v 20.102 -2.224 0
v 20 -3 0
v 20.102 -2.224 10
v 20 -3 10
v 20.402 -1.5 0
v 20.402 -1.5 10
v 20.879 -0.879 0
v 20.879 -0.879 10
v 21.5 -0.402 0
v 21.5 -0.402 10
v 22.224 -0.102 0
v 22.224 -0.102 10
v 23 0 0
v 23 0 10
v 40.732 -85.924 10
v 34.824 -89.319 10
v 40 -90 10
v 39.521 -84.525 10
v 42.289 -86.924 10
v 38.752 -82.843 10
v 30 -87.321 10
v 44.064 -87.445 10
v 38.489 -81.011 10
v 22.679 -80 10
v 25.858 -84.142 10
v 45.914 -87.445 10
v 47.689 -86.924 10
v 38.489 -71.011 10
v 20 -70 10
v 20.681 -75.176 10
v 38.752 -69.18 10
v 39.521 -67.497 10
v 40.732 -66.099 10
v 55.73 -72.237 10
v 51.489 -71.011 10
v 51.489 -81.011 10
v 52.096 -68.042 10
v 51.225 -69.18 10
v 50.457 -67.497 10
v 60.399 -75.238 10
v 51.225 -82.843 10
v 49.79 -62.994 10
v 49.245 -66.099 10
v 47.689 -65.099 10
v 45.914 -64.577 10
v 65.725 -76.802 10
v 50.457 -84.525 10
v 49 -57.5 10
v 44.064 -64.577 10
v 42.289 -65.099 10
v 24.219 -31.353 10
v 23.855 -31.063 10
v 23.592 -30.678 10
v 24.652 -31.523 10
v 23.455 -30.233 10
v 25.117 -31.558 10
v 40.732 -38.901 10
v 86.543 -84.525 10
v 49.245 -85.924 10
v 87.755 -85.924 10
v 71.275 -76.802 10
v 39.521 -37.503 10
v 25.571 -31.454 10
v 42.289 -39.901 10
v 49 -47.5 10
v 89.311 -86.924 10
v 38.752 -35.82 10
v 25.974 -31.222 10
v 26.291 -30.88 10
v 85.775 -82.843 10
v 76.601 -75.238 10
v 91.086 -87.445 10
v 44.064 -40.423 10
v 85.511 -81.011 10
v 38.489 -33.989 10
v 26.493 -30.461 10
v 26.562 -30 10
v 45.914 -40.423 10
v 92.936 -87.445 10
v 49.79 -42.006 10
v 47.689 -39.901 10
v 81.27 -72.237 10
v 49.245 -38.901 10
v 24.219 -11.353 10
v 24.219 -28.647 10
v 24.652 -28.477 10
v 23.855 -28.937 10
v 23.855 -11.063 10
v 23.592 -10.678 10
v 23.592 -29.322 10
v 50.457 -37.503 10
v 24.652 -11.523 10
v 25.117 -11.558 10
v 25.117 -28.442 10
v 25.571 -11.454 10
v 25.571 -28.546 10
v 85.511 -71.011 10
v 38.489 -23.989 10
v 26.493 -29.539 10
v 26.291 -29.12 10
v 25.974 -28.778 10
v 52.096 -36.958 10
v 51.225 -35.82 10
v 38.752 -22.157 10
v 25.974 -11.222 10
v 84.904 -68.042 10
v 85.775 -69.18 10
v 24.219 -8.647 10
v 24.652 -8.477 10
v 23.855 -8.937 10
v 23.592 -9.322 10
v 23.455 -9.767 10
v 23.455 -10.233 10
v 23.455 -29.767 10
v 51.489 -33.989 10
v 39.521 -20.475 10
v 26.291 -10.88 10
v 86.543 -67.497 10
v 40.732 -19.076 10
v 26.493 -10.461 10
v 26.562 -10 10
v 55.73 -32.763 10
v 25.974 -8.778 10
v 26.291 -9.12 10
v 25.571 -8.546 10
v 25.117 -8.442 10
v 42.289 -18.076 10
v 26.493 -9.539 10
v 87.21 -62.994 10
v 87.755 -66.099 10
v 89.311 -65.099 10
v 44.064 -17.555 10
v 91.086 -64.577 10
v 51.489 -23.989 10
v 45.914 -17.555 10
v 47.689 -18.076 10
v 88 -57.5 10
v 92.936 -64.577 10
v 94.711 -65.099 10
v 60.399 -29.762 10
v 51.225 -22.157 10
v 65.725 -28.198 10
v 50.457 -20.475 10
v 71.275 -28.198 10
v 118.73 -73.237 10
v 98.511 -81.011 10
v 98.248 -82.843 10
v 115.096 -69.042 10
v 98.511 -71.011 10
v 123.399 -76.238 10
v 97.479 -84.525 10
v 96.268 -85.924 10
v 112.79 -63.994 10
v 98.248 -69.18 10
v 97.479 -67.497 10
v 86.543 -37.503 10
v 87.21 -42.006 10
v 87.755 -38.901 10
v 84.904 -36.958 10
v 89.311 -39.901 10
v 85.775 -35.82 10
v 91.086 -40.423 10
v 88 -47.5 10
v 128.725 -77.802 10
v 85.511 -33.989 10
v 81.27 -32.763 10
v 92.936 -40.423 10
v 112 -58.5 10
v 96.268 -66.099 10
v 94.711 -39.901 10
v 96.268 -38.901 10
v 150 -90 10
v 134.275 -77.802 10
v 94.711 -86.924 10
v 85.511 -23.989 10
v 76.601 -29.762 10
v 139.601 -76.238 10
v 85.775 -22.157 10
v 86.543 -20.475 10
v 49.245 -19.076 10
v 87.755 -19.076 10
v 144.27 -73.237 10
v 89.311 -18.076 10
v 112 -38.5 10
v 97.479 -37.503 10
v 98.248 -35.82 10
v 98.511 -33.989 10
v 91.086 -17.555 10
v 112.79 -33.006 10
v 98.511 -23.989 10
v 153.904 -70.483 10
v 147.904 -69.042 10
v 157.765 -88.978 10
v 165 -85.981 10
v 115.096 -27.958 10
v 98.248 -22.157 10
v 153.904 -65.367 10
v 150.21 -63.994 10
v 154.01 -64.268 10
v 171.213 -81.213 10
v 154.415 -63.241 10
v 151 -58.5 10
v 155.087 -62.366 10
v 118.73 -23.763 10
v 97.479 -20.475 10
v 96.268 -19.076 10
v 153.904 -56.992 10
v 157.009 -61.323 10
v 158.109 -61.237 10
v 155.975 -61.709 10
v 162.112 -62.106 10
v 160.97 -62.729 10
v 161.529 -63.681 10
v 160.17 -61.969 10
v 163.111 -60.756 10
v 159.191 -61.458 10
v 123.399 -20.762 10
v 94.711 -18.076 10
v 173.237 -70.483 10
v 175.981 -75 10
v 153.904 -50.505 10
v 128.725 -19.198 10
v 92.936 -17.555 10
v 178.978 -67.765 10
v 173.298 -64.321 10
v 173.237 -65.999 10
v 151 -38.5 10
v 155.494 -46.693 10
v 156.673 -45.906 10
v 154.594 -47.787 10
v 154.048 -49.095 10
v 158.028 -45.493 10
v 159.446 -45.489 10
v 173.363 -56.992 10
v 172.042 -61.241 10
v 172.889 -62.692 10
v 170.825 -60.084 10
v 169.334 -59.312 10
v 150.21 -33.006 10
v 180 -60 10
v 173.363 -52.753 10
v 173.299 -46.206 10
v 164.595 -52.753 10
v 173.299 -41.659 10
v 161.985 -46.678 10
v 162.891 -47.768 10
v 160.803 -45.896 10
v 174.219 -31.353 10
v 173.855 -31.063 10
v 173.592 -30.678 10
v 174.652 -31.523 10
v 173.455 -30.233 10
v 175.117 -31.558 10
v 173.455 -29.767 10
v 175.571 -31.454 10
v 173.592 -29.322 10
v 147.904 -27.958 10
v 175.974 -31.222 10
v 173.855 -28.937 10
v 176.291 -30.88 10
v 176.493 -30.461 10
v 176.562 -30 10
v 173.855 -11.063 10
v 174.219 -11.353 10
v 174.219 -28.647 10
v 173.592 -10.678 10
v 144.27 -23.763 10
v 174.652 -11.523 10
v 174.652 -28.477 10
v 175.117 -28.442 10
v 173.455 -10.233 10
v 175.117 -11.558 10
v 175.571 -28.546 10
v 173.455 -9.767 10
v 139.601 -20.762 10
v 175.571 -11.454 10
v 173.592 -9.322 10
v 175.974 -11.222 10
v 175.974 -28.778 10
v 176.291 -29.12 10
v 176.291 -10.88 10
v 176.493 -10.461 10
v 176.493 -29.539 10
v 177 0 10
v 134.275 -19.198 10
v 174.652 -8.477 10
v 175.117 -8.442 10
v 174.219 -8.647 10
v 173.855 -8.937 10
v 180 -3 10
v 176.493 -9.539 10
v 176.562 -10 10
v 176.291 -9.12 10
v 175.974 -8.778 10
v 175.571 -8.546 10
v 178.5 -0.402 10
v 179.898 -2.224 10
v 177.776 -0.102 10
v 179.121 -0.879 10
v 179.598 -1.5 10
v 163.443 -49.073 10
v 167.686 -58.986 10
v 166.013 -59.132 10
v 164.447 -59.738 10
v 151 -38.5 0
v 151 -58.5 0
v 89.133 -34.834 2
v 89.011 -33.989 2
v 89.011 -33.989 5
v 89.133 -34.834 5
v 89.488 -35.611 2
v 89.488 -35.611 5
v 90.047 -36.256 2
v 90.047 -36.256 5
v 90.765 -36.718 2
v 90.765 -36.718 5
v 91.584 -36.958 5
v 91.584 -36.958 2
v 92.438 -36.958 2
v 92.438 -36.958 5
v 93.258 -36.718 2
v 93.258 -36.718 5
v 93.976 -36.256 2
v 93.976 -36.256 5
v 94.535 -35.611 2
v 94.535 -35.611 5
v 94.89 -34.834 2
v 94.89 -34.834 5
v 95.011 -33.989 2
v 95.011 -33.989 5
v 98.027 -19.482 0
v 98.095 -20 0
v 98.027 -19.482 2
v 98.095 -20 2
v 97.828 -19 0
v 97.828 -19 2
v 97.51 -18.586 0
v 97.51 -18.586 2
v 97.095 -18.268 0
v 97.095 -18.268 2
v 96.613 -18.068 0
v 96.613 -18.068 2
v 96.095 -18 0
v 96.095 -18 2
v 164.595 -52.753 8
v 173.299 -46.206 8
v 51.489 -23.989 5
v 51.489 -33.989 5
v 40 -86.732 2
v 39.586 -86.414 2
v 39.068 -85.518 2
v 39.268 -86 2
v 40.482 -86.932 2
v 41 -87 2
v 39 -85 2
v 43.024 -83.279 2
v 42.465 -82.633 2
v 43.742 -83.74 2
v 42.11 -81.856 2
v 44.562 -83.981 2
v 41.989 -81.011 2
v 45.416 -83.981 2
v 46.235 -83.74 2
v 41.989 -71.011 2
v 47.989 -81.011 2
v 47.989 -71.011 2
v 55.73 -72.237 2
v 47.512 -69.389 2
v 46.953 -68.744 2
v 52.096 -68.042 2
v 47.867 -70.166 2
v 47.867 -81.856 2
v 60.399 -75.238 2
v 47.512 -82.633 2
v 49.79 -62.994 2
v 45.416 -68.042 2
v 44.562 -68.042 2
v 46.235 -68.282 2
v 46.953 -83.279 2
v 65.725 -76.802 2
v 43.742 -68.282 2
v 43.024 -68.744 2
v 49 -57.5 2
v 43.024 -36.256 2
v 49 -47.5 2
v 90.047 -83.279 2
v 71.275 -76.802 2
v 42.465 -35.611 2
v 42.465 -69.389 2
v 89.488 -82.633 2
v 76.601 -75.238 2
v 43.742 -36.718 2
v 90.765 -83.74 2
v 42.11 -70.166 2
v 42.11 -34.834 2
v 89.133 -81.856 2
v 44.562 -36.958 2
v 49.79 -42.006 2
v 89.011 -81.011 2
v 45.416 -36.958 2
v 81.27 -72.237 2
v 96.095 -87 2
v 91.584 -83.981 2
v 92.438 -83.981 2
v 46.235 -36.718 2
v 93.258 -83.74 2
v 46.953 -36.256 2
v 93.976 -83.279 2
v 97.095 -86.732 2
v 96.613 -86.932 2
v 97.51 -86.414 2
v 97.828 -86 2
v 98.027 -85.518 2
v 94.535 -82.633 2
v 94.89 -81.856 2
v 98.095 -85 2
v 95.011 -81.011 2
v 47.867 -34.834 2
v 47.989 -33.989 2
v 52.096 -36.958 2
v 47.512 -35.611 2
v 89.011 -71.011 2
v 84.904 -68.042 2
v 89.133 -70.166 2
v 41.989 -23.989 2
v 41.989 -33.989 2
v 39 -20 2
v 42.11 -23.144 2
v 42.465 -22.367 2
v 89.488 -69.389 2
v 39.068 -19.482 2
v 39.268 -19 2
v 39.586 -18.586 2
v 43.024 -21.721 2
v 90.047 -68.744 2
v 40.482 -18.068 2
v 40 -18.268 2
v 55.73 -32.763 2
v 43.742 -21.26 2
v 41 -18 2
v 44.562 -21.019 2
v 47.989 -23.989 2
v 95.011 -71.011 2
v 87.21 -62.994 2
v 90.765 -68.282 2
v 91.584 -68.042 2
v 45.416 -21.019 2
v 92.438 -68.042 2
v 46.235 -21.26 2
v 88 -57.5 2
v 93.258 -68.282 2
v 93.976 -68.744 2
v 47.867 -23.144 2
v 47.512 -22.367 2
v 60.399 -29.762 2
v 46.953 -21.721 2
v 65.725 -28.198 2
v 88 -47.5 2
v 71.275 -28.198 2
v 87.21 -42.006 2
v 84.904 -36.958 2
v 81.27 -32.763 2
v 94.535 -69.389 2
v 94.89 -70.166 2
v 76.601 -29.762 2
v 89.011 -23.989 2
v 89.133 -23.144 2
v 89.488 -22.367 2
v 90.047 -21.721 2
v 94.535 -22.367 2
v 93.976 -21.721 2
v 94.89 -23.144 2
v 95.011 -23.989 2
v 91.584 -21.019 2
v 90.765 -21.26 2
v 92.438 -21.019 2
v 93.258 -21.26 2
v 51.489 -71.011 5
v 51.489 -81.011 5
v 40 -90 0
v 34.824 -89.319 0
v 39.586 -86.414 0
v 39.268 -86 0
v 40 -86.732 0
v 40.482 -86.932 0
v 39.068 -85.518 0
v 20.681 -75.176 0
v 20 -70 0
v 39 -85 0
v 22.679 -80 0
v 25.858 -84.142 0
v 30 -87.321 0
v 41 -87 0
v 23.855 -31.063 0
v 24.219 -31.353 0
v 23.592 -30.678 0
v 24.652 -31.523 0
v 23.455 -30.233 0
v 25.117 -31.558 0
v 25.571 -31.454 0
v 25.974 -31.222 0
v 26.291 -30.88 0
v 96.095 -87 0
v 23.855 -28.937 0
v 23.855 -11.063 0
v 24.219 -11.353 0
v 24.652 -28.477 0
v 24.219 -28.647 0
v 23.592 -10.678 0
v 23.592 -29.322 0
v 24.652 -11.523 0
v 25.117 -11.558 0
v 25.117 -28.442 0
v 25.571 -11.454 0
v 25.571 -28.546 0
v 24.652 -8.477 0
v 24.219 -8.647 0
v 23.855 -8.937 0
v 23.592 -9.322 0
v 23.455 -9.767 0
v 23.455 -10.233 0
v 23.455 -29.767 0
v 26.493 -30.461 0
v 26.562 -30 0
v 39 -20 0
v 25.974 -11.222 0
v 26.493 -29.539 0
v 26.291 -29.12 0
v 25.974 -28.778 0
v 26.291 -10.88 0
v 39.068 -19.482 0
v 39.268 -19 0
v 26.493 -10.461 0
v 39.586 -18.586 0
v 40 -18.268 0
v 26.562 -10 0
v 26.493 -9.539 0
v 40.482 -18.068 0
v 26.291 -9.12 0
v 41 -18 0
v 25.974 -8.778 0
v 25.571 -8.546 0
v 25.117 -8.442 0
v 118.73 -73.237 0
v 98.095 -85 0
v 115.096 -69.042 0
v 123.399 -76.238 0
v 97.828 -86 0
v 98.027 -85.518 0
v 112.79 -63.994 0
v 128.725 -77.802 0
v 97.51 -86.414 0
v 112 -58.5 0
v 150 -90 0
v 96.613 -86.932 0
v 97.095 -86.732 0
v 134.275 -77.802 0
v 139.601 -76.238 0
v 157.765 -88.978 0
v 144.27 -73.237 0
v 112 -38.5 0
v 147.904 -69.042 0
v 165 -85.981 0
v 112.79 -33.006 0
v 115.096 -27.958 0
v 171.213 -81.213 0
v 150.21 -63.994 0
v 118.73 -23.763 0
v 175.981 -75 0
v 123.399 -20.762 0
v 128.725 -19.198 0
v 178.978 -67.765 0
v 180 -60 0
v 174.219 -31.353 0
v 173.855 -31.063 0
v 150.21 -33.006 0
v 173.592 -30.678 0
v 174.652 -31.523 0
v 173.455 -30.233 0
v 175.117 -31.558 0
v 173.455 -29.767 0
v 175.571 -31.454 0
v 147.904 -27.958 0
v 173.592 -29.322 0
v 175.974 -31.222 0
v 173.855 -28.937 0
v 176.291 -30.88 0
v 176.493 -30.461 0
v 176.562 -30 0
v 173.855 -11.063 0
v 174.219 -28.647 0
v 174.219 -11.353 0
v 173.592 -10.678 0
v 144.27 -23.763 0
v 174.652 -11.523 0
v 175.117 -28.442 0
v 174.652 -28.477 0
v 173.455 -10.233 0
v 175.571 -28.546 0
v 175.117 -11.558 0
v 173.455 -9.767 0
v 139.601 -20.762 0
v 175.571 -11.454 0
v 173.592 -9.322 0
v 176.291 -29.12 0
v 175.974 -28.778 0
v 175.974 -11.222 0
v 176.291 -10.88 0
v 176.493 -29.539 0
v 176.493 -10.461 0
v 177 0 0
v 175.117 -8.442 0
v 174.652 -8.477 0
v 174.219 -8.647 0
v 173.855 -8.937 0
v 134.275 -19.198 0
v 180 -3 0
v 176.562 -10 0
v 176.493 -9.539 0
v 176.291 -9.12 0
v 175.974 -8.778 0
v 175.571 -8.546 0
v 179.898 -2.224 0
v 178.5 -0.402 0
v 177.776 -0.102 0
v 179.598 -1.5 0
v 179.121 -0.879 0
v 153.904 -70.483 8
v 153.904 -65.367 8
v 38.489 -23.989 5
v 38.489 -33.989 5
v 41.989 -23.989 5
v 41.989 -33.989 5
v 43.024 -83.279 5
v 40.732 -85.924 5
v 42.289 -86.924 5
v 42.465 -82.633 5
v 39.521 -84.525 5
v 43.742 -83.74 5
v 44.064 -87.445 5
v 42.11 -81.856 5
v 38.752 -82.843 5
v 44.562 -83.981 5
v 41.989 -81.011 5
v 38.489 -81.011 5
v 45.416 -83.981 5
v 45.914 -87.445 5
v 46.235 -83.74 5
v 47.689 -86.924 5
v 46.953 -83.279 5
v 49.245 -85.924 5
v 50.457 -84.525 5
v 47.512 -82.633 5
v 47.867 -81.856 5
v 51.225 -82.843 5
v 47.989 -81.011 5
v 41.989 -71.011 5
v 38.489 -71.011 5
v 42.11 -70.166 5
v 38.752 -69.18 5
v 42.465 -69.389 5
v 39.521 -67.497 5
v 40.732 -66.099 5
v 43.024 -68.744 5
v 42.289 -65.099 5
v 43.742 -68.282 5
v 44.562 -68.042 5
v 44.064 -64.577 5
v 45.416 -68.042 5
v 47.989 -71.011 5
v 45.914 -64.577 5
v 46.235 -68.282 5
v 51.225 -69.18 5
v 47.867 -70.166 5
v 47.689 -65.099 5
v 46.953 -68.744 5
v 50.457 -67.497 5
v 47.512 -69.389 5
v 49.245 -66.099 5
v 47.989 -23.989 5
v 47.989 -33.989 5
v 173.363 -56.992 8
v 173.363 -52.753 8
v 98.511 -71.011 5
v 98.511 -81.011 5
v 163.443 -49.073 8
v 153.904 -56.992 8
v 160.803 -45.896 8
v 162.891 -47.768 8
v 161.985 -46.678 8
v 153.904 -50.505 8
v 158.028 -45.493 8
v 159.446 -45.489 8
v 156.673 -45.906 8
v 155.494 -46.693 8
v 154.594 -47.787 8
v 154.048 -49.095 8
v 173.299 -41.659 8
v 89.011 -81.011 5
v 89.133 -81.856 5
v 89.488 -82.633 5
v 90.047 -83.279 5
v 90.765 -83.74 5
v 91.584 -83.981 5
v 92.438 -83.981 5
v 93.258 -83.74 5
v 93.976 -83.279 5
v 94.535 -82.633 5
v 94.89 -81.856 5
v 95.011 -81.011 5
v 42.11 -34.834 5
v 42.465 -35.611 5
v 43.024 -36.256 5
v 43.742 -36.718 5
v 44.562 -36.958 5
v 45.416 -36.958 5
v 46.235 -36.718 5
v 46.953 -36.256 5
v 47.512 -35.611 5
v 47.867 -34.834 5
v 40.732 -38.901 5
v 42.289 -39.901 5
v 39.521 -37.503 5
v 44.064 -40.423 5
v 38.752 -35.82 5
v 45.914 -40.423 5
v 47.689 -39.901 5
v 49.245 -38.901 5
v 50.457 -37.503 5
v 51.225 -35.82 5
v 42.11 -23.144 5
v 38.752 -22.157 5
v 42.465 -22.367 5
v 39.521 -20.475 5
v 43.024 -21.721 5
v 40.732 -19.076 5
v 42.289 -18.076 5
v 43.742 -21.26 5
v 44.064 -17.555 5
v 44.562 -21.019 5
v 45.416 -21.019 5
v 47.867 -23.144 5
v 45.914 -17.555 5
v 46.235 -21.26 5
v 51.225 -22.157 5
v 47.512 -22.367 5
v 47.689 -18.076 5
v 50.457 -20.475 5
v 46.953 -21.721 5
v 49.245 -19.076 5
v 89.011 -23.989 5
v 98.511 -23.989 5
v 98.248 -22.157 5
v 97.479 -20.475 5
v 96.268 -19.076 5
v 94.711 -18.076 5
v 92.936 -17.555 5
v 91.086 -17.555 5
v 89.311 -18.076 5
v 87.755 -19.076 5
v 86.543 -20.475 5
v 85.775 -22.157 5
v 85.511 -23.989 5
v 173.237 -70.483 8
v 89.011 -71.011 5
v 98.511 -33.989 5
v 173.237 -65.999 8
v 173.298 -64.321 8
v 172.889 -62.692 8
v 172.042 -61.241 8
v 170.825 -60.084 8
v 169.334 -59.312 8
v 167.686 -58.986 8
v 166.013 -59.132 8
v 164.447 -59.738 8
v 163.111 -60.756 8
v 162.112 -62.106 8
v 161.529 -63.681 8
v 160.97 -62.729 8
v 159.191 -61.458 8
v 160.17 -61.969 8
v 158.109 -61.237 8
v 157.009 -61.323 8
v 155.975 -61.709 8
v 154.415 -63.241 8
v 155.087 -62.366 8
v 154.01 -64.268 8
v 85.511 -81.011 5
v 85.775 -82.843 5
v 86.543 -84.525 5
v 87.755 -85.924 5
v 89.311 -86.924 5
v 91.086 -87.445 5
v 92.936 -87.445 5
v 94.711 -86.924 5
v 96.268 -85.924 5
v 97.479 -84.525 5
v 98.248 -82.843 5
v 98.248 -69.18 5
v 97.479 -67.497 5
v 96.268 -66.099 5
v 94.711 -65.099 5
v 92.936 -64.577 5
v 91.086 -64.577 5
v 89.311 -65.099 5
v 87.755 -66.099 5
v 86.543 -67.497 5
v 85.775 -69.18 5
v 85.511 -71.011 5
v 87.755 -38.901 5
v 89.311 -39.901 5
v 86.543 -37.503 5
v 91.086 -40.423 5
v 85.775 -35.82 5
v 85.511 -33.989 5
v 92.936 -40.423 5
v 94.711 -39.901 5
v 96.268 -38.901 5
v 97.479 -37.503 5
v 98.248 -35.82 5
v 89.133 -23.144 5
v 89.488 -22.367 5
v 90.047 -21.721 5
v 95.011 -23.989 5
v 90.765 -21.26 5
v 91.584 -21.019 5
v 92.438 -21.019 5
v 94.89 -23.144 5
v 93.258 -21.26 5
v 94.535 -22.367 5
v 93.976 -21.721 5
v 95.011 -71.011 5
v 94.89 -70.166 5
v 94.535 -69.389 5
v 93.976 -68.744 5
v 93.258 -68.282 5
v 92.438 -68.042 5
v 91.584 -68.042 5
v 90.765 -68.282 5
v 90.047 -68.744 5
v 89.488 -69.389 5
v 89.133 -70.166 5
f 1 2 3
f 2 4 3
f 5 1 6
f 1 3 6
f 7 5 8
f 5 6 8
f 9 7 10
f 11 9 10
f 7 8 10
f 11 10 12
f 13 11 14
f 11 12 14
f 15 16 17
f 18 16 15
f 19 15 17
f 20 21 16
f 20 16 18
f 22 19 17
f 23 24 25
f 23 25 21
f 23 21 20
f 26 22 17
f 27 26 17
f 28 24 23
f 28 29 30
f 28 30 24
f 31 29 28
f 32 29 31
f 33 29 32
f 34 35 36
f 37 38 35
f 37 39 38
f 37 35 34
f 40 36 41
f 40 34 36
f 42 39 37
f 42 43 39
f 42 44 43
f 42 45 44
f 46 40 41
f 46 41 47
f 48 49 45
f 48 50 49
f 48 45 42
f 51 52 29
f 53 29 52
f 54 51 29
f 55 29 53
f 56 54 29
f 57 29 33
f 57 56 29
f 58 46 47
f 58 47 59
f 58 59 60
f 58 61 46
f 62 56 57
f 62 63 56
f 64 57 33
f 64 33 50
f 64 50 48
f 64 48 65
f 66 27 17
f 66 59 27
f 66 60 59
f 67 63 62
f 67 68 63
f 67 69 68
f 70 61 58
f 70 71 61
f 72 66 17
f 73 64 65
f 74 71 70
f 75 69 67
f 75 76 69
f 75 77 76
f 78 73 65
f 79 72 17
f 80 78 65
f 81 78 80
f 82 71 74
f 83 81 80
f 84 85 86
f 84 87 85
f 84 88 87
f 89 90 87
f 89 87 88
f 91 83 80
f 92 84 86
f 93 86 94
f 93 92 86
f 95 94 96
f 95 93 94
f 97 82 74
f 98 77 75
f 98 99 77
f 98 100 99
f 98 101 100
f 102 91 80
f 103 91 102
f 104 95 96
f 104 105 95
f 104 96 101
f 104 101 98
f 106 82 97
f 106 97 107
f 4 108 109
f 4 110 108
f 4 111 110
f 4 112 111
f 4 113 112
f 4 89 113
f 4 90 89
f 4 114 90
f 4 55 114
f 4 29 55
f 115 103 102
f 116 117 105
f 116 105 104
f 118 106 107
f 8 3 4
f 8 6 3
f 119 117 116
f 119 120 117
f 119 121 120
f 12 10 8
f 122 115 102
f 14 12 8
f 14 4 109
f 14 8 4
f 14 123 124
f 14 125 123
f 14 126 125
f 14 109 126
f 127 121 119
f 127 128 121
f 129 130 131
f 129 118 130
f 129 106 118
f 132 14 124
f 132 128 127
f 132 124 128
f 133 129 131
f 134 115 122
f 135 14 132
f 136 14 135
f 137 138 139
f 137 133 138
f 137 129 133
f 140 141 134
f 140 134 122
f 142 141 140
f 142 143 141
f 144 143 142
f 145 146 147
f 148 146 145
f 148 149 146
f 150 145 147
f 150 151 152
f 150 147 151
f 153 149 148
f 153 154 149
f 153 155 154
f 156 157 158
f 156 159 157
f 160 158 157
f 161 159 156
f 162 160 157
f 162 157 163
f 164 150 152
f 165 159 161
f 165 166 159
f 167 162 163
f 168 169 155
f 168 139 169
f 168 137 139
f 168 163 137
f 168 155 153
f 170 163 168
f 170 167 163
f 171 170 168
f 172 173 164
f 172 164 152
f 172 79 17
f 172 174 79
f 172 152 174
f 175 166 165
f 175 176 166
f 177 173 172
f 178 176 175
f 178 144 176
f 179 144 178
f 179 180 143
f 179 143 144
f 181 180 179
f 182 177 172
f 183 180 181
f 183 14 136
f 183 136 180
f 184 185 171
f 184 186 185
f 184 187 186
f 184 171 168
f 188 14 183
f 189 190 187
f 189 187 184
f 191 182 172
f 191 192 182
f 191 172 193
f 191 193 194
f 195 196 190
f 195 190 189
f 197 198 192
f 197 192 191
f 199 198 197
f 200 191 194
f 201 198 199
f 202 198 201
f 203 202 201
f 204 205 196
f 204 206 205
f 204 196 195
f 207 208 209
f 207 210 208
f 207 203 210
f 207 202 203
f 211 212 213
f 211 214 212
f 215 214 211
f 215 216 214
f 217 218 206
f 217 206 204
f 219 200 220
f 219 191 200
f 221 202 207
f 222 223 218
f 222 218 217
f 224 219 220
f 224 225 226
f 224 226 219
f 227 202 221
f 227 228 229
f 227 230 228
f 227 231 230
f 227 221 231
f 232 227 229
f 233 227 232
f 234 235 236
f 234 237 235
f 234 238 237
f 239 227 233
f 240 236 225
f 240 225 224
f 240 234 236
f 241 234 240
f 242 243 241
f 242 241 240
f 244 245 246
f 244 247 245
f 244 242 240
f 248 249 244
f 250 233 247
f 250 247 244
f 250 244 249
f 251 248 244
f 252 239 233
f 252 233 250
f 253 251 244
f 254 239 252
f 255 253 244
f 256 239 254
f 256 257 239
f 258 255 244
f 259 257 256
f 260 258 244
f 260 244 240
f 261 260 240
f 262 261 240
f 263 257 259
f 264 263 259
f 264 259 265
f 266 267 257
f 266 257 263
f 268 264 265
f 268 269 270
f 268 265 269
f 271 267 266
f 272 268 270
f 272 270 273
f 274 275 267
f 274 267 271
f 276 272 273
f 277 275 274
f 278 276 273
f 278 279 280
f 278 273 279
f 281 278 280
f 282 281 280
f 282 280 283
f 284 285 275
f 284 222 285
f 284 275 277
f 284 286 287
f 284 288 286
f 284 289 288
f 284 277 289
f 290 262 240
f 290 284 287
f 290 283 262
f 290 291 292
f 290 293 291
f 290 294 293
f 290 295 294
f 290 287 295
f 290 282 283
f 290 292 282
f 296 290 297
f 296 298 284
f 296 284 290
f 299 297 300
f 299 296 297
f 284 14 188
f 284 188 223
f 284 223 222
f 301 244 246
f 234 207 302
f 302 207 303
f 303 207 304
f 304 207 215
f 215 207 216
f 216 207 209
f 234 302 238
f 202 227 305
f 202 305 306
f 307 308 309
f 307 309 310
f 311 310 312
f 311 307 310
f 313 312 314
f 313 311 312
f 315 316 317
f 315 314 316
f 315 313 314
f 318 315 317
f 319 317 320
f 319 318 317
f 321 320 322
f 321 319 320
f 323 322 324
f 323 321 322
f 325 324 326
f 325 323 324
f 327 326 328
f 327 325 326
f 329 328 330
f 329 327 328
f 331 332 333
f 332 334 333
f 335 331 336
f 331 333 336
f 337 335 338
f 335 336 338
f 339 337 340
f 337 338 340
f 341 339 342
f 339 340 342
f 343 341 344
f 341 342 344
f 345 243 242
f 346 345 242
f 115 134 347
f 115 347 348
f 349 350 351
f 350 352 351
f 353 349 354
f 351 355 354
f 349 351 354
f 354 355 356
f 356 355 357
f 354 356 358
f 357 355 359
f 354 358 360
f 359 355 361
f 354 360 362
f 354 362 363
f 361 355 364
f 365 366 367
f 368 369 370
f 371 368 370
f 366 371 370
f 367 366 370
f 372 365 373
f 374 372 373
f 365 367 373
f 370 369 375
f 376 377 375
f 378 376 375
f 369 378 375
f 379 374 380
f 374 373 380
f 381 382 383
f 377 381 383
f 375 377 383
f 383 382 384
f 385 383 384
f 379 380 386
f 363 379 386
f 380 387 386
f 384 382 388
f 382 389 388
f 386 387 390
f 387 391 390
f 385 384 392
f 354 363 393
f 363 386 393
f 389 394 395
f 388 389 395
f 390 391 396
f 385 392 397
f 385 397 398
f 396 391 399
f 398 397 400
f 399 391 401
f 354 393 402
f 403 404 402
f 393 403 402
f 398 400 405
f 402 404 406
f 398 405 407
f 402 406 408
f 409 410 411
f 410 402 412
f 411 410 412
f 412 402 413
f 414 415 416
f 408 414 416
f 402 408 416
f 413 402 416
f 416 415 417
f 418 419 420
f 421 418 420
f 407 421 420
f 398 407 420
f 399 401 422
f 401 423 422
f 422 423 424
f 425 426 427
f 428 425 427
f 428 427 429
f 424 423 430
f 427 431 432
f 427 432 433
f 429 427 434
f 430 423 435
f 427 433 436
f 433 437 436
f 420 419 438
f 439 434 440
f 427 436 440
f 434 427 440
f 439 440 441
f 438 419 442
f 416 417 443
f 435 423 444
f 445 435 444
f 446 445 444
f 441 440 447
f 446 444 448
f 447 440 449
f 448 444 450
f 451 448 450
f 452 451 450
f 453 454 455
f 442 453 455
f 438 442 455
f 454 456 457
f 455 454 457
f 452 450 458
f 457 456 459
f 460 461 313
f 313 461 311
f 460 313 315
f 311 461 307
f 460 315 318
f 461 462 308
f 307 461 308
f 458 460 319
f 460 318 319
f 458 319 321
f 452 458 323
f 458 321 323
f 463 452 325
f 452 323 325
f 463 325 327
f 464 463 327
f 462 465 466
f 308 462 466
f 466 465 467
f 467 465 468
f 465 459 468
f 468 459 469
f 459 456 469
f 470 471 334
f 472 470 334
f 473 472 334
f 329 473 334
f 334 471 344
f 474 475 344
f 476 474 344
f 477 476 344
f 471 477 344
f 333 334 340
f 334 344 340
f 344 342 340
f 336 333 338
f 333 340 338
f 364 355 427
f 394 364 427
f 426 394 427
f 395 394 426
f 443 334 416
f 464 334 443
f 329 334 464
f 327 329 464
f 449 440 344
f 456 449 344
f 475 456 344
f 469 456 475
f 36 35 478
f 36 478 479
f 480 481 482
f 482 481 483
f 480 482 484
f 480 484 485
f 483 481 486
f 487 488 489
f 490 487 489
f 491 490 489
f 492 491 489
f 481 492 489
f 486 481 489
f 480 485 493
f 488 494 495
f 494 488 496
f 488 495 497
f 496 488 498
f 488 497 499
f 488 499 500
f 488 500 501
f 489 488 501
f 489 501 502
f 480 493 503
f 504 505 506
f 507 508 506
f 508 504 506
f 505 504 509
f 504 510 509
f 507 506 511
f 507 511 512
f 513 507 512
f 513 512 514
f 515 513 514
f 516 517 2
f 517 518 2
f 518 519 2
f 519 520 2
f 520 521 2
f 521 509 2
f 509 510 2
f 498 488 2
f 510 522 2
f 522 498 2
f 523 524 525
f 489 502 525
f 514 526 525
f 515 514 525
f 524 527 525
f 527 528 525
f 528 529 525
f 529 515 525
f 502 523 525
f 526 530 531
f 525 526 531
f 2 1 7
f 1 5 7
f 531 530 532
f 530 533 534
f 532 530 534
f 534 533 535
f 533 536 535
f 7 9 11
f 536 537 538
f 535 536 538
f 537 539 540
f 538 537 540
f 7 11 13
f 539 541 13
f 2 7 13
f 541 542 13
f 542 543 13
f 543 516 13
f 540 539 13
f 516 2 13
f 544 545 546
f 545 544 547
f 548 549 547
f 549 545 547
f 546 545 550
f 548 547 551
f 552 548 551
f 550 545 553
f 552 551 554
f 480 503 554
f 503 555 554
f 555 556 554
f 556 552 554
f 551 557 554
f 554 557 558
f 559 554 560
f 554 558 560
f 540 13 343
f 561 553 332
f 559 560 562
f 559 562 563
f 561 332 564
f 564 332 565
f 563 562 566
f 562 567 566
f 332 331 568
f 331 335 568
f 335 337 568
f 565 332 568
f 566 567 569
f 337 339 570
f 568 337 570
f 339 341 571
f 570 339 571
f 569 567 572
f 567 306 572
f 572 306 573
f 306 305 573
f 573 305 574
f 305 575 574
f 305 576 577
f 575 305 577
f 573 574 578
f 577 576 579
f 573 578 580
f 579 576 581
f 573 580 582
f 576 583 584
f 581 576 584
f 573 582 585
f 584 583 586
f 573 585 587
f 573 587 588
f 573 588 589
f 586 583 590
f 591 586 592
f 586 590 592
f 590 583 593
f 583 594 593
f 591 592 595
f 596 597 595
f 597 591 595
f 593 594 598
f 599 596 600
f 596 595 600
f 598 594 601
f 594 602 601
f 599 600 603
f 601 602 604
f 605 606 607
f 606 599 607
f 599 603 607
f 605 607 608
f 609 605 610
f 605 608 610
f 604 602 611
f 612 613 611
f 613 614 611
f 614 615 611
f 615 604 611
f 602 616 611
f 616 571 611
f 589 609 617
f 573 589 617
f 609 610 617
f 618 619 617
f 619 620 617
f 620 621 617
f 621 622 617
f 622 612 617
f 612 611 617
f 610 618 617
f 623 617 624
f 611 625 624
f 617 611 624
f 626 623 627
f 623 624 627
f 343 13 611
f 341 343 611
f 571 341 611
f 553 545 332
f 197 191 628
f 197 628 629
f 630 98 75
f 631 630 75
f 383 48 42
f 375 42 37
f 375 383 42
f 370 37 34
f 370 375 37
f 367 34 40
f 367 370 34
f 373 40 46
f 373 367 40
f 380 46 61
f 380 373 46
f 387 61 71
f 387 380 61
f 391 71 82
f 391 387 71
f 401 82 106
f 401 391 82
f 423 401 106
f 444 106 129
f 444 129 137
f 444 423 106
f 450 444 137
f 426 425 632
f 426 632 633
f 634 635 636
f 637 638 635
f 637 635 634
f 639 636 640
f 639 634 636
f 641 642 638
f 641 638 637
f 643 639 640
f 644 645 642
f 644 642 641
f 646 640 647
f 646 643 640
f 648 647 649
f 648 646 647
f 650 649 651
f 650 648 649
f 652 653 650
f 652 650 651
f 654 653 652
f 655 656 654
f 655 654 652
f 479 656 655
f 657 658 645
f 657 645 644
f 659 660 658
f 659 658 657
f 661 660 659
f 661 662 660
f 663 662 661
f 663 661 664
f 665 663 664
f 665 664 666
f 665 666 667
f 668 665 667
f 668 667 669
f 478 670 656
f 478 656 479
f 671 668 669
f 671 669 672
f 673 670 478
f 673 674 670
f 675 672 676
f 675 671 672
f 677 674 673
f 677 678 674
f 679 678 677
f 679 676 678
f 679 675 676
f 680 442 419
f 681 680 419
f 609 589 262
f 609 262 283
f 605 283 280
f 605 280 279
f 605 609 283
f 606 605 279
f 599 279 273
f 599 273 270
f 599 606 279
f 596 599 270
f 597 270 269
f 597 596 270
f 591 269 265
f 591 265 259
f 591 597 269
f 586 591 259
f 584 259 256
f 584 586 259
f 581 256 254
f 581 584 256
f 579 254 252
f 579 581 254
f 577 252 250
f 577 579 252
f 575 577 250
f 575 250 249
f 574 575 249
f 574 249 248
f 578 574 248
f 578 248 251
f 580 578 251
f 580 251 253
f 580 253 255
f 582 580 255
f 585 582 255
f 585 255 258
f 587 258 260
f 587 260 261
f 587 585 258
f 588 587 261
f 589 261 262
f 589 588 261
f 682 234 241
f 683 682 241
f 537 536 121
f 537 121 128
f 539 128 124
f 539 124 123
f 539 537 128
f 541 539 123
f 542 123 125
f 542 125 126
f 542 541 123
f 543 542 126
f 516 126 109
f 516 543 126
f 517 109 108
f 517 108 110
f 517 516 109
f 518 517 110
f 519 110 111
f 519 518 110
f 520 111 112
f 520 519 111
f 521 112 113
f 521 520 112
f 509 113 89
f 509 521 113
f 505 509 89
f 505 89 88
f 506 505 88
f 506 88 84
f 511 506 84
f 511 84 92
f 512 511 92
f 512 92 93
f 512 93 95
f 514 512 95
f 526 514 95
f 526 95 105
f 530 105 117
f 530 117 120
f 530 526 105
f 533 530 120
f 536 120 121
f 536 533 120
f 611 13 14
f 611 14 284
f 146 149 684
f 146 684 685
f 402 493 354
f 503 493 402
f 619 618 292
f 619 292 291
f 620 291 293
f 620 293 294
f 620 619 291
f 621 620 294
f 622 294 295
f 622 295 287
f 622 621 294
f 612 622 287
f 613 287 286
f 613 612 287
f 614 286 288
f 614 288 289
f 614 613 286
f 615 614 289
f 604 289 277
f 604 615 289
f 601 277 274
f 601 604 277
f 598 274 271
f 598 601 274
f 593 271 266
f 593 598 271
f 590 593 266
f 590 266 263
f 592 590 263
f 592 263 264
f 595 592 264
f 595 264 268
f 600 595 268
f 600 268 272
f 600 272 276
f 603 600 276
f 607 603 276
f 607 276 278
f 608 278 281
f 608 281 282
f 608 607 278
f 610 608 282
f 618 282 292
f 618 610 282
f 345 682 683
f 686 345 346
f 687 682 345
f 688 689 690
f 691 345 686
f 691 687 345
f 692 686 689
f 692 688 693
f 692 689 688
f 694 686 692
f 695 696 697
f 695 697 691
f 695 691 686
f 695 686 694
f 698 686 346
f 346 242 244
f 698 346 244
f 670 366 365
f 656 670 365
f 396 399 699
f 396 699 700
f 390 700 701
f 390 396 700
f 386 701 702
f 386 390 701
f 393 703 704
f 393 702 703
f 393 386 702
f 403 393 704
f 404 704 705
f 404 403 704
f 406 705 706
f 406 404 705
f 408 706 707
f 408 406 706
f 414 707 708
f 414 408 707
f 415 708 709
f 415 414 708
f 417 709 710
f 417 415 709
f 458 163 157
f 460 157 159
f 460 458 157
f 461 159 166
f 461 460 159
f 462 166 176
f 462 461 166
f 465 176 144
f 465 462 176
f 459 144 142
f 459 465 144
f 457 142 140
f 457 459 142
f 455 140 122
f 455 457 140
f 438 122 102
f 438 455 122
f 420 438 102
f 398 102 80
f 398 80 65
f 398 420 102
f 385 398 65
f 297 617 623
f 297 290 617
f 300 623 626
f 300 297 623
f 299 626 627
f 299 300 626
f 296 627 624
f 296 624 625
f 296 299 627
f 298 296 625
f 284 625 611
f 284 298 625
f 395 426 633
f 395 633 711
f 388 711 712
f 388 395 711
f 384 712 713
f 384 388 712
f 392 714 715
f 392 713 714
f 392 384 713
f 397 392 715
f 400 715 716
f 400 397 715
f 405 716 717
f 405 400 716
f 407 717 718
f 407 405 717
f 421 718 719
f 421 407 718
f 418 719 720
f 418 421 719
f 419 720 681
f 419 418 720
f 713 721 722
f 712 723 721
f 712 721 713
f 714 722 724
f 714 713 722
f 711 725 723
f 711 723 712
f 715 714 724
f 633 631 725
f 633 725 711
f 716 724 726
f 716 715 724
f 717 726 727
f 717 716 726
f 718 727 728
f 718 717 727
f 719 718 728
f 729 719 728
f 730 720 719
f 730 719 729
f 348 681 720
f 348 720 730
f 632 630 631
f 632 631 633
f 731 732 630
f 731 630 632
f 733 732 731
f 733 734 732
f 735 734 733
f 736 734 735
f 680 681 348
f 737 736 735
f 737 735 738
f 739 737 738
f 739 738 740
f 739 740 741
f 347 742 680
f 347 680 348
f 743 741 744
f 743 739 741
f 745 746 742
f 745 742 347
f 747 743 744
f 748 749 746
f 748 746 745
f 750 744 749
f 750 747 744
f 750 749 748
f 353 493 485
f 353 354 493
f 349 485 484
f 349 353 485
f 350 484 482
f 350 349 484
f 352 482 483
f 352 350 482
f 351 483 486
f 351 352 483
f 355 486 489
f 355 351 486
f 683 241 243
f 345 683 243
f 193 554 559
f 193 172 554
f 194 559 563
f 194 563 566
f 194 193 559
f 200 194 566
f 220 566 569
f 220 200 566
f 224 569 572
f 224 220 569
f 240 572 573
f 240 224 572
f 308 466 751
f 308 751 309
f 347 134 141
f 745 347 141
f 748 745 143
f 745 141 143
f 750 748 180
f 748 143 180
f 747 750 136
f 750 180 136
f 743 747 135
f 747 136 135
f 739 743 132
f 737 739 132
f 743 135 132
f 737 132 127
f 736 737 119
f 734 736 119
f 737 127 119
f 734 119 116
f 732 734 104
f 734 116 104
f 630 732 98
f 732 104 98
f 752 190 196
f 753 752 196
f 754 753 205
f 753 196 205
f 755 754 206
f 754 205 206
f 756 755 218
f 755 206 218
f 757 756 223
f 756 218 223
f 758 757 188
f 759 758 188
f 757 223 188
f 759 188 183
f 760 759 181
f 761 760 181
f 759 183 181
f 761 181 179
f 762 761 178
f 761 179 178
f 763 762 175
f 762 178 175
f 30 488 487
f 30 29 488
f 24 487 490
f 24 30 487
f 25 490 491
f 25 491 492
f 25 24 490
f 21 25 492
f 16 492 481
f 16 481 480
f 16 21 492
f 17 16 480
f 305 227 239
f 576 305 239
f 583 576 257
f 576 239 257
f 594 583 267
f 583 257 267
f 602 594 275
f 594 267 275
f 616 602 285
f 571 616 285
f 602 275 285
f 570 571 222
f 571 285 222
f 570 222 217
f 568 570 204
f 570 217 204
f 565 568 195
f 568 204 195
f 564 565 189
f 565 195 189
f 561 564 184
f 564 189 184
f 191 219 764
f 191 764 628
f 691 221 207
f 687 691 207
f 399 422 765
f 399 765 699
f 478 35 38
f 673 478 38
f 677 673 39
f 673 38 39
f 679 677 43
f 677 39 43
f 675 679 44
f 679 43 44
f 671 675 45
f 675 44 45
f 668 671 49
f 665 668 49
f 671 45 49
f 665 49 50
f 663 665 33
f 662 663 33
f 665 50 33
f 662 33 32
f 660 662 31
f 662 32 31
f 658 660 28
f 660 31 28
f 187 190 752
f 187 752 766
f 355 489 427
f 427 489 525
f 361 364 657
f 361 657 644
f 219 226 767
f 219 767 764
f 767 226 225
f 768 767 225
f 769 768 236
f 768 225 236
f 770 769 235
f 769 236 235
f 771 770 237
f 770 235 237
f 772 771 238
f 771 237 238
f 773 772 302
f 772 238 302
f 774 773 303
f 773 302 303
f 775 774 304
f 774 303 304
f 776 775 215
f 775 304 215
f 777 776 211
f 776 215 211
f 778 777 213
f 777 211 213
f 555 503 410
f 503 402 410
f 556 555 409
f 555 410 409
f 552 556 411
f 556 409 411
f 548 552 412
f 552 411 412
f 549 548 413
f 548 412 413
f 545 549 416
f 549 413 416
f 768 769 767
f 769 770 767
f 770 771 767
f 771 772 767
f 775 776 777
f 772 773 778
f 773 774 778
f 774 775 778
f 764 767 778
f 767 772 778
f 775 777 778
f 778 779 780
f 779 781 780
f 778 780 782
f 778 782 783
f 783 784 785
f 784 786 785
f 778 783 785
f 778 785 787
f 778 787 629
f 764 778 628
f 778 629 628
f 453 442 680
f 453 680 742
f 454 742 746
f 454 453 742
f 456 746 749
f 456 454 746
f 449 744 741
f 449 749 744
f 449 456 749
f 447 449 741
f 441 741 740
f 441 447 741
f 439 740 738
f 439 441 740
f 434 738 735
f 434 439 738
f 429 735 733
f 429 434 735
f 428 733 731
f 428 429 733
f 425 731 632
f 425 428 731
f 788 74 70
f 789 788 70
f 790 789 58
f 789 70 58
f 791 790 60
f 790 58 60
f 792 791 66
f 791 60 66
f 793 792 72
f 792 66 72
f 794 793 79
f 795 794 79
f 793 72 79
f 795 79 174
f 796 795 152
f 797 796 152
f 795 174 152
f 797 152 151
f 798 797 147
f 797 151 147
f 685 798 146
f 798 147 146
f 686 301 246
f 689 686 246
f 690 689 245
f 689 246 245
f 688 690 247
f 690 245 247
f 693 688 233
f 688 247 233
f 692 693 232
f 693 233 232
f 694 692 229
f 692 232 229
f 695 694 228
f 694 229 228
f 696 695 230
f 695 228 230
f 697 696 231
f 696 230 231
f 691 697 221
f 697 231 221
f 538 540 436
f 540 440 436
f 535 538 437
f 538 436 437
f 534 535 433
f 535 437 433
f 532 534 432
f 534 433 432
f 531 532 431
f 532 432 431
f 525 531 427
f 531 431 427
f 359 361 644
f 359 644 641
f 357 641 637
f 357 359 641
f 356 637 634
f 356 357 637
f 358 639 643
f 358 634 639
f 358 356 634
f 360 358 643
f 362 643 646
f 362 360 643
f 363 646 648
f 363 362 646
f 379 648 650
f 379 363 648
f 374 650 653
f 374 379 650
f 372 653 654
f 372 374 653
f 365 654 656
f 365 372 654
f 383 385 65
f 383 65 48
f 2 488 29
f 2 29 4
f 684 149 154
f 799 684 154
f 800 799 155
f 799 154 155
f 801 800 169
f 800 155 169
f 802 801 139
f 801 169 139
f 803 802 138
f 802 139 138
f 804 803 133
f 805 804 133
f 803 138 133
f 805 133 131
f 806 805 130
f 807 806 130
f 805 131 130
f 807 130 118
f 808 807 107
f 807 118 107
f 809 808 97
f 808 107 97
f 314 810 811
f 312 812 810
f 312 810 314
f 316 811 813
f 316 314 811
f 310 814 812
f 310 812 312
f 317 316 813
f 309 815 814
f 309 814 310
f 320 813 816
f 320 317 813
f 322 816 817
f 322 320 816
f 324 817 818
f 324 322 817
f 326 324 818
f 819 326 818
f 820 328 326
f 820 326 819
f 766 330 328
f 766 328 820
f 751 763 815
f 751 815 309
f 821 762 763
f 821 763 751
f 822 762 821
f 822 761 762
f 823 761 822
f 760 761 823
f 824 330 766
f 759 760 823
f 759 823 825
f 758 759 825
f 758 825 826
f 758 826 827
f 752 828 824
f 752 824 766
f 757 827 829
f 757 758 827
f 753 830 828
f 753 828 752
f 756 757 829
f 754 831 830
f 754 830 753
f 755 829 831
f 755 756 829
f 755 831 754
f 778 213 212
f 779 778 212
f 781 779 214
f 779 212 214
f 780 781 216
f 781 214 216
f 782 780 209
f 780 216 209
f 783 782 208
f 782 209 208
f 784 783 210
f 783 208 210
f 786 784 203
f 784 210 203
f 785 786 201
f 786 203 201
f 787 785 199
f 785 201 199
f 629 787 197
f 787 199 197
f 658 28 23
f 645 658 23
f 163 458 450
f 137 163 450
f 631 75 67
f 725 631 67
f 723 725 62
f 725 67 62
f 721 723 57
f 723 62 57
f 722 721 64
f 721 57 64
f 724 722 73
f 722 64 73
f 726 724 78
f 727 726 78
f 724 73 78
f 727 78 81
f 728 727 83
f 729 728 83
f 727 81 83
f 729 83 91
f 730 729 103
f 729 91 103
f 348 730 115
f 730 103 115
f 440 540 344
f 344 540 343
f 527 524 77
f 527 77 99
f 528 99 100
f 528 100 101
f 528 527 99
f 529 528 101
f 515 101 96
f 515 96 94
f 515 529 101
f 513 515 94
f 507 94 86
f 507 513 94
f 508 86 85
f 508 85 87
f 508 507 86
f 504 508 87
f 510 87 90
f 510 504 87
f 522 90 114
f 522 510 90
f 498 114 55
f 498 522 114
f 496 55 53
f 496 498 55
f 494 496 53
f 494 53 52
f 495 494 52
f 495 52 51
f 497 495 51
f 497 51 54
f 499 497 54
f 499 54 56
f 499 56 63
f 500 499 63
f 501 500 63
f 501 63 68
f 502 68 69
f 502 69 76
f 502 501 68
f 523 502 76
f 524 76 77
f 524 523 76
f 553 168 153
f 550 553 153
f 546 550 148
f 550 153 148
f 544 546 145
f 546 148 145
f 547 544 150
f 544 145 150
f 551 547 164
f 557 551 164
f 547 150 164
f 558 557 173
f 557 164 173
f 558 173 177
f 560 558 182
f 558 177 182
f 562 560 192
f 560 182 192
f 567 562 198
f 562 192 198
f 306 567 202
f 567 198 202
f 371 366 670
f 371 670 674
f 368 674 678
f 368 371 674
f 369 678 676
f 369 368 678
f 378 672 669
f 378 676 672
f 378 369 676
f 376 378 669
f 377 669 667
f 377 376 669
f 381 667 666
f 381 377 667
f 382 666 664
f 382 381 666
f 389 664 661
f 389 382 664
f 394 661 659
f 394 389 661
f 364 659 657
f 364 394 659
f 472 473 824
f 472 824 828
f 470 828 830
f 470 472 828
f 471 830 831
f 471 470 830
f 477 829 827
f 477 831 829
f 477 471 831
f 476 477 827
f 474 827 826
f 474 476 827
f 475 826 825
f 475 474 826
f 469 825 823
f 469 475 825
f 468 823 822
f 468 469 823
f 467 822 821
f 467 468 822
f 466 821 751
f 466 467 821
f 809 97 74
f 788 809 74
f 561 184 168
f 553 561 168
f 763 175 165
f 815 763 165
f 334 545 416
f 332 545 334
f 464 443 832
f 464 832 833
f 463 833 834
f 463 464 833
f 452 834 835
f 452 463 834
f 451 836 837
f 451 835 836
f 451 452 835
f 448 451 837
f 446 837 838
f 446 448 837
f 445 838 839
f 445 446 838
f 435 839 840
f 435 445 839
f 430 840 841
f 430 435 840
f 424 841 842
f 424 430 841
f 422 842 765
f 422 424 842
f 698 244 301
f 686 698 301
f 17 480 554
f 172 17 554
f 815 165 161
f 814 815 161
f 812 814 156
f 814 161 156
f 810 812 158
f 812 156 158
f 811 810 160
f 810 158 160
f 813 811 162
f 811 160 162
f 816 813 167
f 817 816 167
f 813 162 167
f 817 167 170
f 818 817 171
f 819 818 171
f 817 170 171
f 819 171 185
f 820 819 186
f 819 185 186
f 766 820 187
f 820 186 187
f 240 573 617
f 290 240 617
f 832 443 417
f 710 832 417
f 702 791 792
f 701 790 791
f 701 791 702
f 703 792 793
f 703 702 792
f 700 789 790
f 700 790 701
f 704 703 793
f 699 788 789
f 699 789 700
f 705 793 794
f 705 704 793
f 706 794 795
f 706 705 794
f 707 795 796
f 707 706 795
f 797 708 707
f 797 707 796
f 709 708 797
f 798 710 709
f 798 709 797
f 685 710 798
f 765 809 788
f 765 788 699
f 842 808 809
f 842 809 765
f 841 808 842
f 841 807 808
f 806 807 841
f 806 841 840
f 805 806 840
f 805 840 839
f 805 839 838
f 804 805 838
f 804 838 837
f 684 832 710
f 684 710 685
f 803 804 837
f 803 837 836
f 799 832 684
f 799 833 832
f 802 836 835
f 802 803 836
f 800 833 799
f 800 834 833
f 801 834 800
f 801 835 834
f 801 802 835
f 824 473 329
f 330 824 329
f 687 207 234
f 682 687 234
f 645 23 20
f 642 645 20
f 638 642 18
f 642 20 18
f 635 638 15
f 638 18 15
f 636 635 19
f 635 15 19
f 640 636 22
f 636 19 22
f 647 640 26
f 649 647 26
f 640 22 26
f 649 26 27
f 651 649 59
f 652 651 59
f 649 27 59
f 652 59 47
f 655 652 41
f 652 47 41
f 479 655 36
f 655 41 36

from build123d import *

# Parameters (mm, degrees)
SKETCH_W        = 160
SKETCH_H        = 90
SKETCH_R        = 1.5625
PAD_DEPTH       = 10
POCKET_DEPTH    = 5
FILLET_R        = 20
FILLET001_R     = 30
POCKET001_DEPTH = 10.001
FILLET002_R     = 3
SKETCH003_W     = 59.09549
SKETCH003_H     = 69
POCKET002_DEPTH = 2
FILLET003_R     = 2
POCKET003_DEPTH = 2


with BuildPart() as part:
    # Sketch → Pad (new body)
    with BuildSketch(Plane.XY):
        with Locations((100, -45)):
            Rectangle(SKETCH_W, SKETCH_H)
        with Locations((175, -10)):
            Circle(SKETCH_R, mode=Mode.SUBTRACT)
        with Locations((175, -30)):
            Circle(SKETCH_R, mode=Mode.SUBTRACT)
        with Locations((25, -10)):
            Circle(SKETCH_R, mode=Mode.SUBTRACT)
        with Locations((25, -30)):
            Circle(SKETCH_R, mode=Mode.SUBTRACT)
        with BuildLine():
            ThreePointArc((95.0113, -23.9887), (92.0113, -20.9887), (89.0113, -23.9887))
            Line((89.0113, -23.9887), (89.0113, -33.9887))
            ThreePointArc((89.0113, -33.9887), (92.0113, -36.9887), (95.0113, -33.9887))
            Line((95.0113, -23.9887), (95.0113, -33.9887))
        make_face(mode=Mode.SUBTRACT)
        with BuildLine():
            ThreePointArc((88, -47.5), (68.5, -28), (49, -47.5))
            Line((49, -47.5), (49, -57.5))
            ThreePointArc((49, -57.5), (68.5, -77), (88, -57.5))
            Line((88, -47.5), (88, -57.5))
        make_face(mode=Mode.SUBTRACT)
        with BuildLine():
            ThreePointArc((95.0113, -71.0113), (92.0113, -68.0113), (89.0113, -71.0113))
            Line((89.0113, -71.0113), (89.0113, -81.0113))
            ThreePointArc((89.0113, -81.0113), (92.0113, -84.0113), (95.0113, -81.0113))
            Line((95.0113, -71.0113), (95.0113, -81.0113))
        make_face(mode=Mode.SUBTRACT)
        with BuildLine():
            ThreePointArc((47.9887, -71.0113), (44.9887, -68.0113), (41.9887, -71.0113))
            Line((41.9887, -71.0113), (41.9887, -81.0113))
            ThreePointArc((41.9887, -81.0113), (44.9887, -84.0113), (47.9887, -81.0113))
            Line((47.9887, -71.0113), (47.9887, -81.0113))
        make_face(mode=Mode.SUBTRACT)
        with BuildLine():
            ThreePointArc((47.9887, -23.9887), (44.9887, -20.9887), (41.9887, -23.9887))
            Line((41.9887, -23.9887), (41.9887, -33.9887))
            ThreePointArc((41.9887, -33.9887), (44.9887, -36.9887), (47.9887, -33.9887))
            Line((47.9887, -23.9887), (47.9887, -33.9887))
        make_face(mode=Mode.SUBTRACT)
    extrude(amount=PAD_DEPTH)

    # Sketch001 (on Face30 of Pad) → Pocket (cut)
    with BuildSketch(Plane.XY.offset(10)):
        with BuildLine():
            ThreePointArc((98.5113, -23.9887), (92.0113, -17.4887), (85.5113, -23.9887))
            Line((85.5113, -23.9887), (85.5113, -33.9887))
            ThreePointArc((85.5113, -33.9887), (92.0113, -40.4887), (98.5113, -33.9887))
            Line((98.5113, -23.9887), (98.5113, -33.9887))
        make_face()
        with BuildLine():
            ThreePointArc((51.4887, -23.9887), (44.9887, -17.4887), (38.4887, -23.9887))
            Line((38.4887, -23.9887), (38.4887, -33.9887))
            ThreePointArc((38.4887, -33.9887), (44.9887, -40.4887), (51.4887, -33.9887))
            Line((51.4887, -23.9887), (51.4887, -33.9887))
        make_face()
        with BuildLine():
            ThreePointArc((98.5113, -71.0113), (92.0113, -64.5113), (85.5113, -71.0113))
            Line((85.5113, -71.0113), (85.5113, -81.0113))
            ThreePointArc((85.5113, -81.0113), (92.0113, -87.5113), (98.5113, -81.0113))
            Line((98.5113, -71.0113), (98.5113, -81.0113))
        make_face()
        with BuildLine():
            ThreePointArc((51.4887, -71.0113), (44.9887, -64.5113), (38.4887, -71.0113))
            Line((38.4887, -71.0113), (38.4887, -81.0113))
            ThreePointArc((38.4887, -81.0113), (44.9887, -87.5113), (51.4887, -81.0113))
            Line((51.4887, -71.0113), (51.4887, -81.0113))
        make_face()
    extrude(amount=-POCKET_DEPTH, mode=Mode.SUBTRACT)

    # Fillet
    fillet_edges = [part.edges().sort_by_distance(p)[0] for p in [
        (20, -90, 5),
    ]]
    fillet(fillet_edges, radius=FILLET_R)

    # Fillet001
    fillet001_edges = [part.edges().sort_by_distance(p)[0] for p in [
        (180, -90, 5),
    ]]
    fillet(fillet001_edges, radius=FILLET001_R)

    # Sketch002 → Pocket001 (cut, through all)
    with BuildSketch(Plane.XY.offset(10)):
        with BuildLine():
            ThreePointArc((151, -38.5), (131.5, -19), (112, -38.5))
            Line((112, -38.5), (112, -58.5))
            ThreePointArc((112, -58.5), (131.5, -78), (151, -58.5))
            Line((151, -38.5), (151, -58.5))
        make_face()
    extrude(amount=-POCKET001_DEPTH, mode=Mode.SUBTRACT)

    # Fillet002
    fillet002_edges = [part.edges().sort_by_distance(p)[0] for p in [
        (20, 0, 5),
        (180, 0, 5),
    ]]
    fillet(fillet002_edges, radius=FILLET002_R)

    # Sketch003 (on Face38 of Fillet002) → Pocket002 (cut)
    with BuildSketch(Plane.XY):
        with Locations((68.547745, -52.5)):
            Rectangle(SKETCH003_W, SKETCH003_H)
    extrude(amount=POCKET002_DEPTH, mode=Mode.SUBTRACT)

    # Fillet003
    fillet003_edges = [part.edges().sort_by_distance(p)[0] for p in [
        (98.09549, -18, 1),
        (39, -18, 1),
        (39, -87, 1),
        (98.09549, -87, 1),
    ]]
    fillet(fillet003_edges, radius=FILLET003_R)

    # Sketch004 (on Face27 of Fillet003) → Pocket003 (cut)
    with BuildSketch(Plane(origin=(37, -216, 10), x_dir=(0, 1, 0), z_dir=(0, 0, 1))):
        with BuildLine():
            Line((145.517159, -116.903893), (150.632976, -116.903893))
            ThreePointArc((152.318723, -124.528938), (154.676782, -120.008753), (150.632976, -116.903893))
            ThreePointArc((150.000824, -136.237228), (156.909165, -131.521294), (152.318723, -124.528938))
            Line((150.000824, -136.237228), (145.517159, -136.237228))
            Line((145.517159, -136.237228), (145.517159, -116.903893))
        make_face()
        with BuildLine():
            Line((165.495066, -116.903893), (159.00824, -116.903893))
            Line((159.00824, -116.903893), (159.00824, -136.362732))
            Line((159.00824, -136.362732), (163.24652, -136.362732))
            Line((163.24652, -136.362732), (163.24652, -127.595039))
            Line((163.24652, -127.595039), (169.794234, -136.298567))
            Line((169.794234, -136.298567), (174.341334, -136.298567))
            Line((174.341334, -136.298567), (166.926646, -126.442617))
            ThreePointArc((166.926646, -126.442617), (170.507239, -121.02845), (165.495066, -116.903893))
        make_face()
    extrude(amount=-POCKET003_DEPTH, mode=Mode.SUBTRACT)


solid = part.part
